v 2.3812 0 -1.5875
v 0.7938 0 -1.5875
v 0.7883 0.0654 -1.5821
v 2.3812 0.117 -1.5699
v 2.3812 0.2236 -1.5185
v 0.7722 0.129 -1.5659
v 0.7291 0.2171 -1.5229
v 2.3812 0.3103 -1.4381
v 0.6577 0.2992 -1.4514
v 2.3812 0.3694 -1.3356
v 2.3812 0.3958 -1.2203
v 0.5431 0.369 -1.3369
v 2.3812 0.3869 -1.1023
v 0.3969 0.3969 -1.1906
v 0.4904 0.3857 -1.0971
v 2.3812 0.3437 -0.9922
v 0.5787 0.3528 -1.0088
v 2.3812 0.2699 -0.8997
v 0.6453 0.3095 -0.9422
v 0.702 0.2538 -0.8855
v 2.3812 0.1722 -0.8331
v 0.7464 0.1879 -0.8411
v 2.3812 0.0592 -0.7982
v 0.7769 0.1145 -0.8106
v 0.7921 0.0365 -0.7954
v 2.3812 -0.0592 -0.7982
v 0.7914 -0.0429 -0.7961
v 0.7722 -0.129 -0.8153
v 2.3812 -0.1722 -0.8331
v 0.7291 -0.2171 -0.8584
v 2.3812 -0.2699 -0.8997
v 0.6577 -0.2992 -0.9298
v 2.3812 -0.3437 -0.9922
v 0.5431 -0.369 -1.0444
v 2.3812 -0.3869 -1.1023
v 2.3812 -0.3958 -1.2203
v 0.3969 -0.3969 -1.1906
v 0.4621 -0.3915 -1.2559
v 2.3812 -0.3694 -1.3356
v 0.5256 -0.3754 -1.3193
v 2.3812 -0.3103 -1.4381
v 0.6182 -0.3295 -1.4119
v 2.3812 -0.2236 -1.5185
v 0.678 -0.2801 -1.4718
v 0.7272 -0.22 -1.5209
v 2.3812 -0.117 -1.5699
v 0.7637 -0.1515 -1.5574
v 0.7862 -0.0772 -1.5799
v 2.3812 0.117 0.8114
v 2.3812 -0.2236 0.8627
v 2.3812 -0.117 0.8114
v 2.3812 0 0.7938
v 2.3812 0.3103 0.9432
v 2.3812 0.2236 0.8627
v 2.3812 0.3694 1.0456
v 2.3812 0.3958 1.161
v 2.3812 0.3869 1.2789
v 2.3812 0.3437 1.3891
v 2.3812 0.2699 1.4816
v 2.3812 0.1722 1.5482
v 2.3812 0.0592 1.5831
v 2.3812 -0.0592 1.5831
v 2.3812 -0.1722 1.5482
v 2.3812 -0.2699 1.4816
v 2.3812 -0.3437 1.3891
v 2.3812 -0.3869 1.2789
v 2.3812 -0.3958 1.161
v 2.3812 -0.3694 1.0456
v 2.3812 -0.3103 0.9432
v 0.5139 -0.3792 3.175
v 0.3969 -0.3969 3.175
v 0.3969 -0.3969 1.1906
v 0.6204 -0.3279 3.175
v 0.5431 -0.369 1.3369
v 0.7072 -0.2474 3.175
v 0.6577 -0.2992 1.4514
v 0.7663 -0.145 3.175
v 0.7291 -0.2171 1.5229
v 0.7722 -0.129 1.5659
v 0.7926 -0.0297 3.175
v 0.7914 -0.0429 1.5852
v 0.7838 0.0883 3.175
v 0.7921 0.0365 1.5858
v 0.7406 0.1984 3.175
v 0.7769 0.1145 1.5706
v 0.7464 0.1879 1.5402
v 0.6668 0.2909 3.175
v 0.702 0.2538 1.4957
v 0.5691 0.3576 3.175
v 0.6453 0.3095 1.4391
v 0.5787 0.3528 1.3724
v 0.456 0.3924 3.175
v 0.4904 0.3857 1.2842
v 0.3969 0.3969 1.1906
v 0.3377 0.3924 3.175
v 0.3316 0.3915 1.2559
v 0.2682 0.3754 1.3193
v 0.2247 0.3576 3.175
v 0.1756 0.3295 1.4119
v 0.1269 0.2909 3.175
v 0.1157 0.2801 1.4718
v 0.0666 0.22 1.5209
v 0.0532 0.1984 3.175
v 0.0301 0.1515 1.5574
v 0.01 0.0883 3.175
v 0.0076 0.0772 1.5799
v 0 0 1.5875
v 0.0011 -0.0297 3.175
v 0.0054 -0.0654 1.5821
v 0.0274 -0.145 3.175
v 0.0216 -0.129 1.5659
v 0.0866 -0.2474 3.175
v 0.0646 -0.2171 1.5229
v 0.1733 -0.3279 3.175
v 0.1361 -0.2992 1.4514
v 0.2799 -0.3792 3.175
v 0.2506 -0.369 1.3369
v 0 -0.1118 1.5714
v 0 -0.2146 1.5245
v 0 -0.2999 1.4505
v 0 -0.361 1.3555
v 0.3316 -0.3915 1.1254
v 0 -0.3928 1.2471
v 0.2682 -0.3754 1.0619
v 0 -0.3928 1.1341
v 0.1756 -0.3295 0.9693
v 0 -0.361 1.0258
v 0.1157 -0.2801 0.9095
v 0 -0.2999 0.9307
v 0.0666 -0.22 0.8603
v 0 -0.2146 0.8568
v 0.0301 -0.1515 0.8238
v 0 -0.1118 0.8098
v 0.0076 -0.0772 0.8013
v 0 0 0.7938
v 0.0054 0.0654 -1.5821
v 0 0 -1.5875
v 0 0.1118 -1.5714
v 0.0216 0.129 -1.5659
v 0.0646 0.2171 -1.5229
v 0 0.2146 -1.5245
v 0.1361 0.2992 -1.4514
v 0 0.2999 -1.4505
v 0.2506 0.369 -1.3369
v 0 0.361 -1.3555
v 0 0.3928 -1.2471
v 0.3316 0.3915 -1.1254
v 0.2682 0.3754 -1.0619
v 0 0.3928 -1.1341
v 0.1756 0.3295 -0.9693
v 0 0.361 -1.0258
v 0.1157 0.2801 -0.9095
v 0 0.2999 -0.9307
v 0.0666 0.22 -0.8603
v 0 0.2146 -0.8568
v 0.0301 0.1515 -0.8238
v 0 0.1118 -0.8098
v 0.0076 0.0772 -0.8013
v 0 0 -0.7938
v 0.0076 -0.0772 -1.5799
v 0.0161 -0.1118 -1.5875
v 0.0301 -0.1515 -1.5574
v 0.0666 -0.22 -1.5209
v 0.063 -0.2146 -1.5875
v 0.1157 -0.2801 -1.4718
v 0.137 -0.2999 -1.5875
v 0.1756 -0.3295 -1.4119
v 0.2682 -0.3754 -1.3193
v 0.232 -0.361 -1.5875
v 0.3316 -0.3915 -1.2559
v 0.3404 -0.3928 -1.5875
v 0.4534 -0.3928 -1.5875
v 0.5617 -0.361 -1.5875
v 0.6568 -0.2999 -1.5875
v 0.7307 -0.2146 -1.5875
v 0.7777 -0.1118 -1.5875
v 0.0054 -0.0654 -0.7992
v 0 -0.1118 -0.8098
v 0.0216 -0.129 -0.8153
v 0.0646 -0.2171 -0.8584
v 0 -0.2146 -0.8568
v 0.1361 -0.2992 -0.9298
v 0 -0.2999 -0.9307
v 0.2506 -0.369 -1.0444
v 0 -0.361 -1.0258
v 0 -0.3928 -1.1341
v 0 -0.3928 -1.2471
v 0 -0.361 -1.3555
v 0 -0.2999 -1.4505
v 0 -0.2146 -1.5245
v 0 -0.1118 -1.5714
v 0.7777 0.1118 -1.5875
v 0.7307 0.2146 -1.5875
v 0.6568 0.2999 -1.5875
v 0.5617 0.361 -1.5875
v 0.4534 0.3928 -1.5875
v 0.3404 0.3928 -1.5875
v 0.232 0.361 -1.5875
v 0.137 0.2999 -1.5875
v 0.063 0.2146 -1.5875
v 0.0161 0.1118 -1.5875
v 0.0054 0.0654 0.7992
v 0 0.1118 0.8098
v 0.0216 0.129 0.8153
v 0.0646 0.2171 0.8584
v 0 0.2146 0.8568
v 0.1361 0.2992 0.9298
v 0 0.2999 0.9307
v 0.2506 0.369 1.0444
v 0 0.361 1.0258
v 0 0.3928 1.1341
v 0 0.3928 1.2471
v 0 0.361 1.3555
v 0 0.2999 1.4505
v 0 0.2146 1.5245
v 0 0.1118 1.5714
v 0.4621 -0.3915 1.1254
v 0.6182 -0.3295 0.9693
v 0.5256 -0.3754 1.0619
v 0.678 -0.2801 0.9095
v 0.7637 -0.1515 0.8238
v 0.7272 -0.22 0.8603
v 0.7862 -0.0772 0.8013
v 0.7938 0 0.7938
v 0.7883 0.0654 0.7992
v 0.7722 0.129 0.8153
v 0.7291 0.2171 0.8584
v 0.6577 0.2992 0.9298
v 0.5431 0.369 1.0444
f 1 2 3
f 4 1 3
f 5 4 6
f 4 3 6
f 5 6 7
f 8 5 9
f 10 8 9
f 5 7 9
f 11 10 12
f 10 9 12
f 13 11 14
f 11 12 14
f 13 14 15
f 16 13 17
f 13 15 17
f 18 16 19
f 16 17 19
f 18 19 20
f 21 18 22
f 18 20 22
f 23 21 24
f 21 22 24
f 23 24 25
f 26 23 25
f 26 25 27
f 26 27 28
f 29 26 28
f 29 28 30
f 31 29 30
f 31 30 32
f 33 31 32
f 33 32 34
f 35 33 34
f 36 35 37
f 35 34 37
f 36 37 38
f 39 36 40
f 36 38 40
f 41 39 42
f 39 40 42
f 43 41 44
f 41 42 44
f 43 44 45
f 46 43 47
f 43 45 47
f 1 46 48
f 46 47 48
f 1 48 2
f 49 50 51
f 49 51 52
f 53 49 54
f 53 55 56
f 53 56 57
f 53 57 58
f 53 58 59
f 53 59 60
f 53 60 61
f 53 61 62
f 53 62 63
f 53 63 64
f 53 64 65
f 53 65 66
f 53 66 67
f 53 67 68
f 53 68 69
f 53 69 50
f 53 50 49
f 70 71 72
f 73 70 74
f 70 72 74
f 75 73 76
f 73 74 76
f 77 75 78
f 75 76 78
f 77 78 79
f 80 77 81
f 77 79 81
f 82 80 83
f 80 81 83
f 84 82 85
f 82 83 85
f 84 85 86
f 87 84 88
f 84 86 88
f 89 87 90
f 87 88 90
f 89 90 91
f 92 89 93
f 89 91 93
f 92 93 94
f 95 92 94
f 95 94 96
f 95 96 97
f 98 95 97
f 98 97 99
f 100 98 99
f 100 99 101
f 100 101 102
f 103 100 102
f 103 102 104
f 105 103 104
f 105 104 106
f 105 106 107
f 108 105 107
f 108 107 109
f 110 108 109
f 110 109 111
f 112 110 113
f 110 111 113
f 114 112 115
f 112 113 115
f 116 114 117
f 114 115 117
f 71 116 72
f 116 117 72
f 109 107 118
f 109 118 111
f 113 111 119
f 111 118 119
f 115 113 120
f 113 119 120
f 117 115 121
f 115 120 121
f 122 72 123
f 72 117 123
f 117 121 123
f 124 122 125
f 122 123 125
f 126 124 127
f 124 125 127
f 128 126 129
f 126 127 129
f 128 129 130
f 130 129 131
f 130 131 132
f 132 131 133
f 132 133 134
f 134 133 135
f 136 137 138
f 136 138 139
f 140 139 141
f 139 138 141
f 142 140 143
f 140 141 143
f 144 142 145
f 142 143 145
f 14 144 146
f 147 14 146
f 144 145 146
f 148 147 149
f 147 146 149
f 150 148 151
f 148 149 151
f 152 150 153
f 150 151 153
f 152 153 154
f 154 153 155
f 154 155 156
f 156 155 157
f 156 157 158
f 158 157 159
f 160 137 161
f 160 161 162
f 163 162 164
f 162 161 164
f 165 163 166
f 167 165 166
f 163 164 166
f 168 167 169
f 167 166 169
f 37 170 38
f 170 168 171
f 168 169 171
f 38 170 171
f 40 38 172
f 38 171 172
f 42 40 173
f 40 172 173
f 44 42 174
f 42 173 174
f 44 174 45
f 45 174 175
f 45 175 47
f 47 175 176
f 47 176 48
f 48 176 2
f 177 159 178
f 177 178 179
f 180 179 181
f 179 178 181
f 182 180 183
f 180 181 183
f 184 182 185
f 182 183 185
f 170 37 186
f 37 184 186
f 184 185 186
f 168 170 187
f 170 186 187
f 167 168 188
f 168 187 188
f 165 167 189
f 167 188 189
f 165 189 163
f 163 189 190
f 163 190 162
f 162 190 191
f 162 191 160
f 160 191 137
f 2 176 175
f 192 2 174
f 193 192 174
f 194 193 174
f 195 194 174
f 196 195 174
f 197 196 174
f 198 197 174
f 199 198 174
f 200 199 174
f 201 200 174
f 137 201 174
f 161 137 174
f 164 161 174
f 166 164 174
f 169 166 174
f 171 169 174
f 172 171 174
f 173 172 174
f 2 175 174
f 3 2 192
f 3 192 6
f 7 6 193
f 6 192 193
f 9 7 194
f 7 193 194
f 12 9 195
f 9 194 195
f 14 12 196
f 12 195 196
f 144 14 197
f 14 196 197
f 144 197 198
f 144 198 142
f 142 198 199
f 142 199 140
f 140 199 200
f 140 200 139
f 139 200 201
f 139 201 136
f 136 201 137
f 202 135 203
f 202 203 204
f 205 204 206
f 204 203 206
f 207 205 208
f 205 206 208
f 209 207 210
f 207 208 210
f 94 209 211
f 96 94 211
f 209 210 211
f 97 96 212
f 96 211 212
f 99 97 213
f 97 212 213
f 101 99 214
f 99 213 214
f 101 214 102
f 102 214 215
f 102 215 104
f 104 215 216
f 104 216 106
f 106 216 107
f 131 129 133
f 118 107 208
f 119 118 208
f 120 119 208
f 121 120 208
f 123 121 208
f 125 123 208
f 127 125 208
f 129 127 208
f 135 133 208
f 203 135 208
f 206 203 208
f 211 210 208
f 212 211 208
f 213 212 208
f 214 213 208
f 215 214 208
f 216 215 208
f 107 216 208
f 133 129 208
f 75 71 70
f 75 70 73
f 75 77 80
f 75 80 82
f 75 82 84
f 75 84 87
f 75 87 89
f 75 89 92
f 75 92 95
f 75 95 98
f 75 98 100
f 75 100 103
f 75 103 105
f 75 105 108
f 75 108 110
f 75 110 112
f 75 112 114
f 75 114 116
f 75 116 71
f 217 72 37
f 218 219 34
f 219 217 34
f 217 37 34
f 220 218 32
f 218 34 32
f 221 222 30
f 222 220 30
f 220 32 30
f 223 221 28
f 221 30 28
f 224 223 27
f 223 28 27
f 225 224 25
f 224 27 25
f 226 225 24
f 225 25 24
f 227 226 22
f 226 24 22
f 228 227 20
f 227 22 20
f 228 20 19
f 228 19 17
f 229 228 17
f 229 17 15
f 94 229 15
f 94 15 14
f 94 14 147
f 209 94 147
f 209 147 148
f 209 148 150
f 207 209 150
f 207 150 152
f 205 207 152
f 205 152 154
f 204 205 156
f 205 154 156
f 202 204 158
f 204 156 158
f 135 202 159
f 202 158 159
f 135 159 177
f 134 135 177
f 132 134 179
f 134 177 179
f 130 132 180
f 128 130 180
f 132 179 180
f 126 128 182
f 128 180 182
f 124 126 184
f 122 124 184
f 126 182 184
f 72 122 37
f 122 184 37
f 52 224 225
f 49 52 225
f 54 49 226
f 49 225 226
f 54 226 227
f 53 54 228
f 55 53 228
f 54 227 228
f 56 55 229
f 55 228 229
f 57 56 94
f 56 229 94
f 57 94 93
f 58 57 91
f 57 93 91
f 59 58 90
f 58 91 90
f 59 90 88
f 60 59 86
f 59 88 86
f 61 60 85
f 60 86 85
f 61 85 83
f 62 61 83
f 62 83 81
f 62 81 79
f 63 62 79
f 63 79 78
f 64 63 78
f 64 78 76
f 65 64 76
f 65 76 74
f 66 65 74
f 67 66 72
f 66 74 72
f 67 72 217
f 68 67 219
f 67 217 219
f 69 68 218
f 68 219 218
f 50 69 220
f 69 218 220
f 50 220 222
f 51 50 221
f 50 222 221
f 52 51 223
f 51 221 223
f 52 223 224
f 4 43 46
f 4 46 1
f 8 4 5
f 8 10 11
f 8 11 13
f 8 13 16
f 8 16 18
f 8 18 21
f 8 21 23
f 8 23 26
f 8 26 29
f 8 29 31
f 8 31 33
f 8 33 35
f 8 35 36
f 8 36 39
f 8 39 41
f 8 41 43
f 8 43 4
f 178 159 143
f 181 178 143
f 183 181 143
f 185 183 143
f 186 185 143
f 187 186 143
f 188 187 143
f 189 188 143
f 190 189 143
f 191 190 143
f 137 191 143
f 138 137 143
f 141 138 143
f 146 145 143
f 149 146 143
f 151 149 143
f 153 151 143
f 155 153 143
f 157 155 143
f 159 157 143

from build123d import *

# Parameters (mm, degrees)
SKETCH3_R                = 0.396875
BOSS_EXTRUDE2_DEPTH      = 2.38125
BOSS_EXTRUDE2_2_DEPTH    = 2.38125
BOSS_EXTRUDE3_DEPTH      = 3.175
BOSS_EXTRUDE3_DEPTH_BACK = 1.5875
SKETCH4_R                = 0.396875


with BuildPart() as part:
    # Sketch3 → Boss-Extrude2 (new body)
    with BuildSketch(Plane(origin=(0, 0, 0), x_dir=(0, 0, -1), z_dir=(1, 0, 0))):
        with Locations((-1.190625, 0)):
            Circle(SKETCH3_R)
    extrude(amount=BOSS_EXTRUDE2_DEPTH)



with BuildPart() as body_2:
    # Sketch3 → Boss-Extrude2 2 (new body)
    with BuildSketch(Plane(origin=(0, 0, 0), x_dir=(0, 0, -1), z_dir=(1, 0, 0))):
        with Locations((1.190625, 0)):
            Circle(SKETCH3_R)
    extrude(amount=BOSS_EXTRUDE2_2_DEPTH)


with BuildPart() as part_1:
    add(part.part)

    add(body_2.part)  # Boss-Extrude3 merges body 2
    # Sketch4 → Boss-Extrude3 (add, two sides: drawn at the far end of the back side and taken through both)
    with BuildSketch(Plane.XY.offset(-BOSS_EXTRUDE3_DEPTH_BACK)):
        with Locations(Location((0.396875, 0, 0), (0, 0, 270))):
            Circle(SKETCH4_R)
    extrude(amount=BOSS_EXTRUDE3_DEPTH + BOSS_EXTRUDE3_DEPTH_BACK)


solid = part_1.part
